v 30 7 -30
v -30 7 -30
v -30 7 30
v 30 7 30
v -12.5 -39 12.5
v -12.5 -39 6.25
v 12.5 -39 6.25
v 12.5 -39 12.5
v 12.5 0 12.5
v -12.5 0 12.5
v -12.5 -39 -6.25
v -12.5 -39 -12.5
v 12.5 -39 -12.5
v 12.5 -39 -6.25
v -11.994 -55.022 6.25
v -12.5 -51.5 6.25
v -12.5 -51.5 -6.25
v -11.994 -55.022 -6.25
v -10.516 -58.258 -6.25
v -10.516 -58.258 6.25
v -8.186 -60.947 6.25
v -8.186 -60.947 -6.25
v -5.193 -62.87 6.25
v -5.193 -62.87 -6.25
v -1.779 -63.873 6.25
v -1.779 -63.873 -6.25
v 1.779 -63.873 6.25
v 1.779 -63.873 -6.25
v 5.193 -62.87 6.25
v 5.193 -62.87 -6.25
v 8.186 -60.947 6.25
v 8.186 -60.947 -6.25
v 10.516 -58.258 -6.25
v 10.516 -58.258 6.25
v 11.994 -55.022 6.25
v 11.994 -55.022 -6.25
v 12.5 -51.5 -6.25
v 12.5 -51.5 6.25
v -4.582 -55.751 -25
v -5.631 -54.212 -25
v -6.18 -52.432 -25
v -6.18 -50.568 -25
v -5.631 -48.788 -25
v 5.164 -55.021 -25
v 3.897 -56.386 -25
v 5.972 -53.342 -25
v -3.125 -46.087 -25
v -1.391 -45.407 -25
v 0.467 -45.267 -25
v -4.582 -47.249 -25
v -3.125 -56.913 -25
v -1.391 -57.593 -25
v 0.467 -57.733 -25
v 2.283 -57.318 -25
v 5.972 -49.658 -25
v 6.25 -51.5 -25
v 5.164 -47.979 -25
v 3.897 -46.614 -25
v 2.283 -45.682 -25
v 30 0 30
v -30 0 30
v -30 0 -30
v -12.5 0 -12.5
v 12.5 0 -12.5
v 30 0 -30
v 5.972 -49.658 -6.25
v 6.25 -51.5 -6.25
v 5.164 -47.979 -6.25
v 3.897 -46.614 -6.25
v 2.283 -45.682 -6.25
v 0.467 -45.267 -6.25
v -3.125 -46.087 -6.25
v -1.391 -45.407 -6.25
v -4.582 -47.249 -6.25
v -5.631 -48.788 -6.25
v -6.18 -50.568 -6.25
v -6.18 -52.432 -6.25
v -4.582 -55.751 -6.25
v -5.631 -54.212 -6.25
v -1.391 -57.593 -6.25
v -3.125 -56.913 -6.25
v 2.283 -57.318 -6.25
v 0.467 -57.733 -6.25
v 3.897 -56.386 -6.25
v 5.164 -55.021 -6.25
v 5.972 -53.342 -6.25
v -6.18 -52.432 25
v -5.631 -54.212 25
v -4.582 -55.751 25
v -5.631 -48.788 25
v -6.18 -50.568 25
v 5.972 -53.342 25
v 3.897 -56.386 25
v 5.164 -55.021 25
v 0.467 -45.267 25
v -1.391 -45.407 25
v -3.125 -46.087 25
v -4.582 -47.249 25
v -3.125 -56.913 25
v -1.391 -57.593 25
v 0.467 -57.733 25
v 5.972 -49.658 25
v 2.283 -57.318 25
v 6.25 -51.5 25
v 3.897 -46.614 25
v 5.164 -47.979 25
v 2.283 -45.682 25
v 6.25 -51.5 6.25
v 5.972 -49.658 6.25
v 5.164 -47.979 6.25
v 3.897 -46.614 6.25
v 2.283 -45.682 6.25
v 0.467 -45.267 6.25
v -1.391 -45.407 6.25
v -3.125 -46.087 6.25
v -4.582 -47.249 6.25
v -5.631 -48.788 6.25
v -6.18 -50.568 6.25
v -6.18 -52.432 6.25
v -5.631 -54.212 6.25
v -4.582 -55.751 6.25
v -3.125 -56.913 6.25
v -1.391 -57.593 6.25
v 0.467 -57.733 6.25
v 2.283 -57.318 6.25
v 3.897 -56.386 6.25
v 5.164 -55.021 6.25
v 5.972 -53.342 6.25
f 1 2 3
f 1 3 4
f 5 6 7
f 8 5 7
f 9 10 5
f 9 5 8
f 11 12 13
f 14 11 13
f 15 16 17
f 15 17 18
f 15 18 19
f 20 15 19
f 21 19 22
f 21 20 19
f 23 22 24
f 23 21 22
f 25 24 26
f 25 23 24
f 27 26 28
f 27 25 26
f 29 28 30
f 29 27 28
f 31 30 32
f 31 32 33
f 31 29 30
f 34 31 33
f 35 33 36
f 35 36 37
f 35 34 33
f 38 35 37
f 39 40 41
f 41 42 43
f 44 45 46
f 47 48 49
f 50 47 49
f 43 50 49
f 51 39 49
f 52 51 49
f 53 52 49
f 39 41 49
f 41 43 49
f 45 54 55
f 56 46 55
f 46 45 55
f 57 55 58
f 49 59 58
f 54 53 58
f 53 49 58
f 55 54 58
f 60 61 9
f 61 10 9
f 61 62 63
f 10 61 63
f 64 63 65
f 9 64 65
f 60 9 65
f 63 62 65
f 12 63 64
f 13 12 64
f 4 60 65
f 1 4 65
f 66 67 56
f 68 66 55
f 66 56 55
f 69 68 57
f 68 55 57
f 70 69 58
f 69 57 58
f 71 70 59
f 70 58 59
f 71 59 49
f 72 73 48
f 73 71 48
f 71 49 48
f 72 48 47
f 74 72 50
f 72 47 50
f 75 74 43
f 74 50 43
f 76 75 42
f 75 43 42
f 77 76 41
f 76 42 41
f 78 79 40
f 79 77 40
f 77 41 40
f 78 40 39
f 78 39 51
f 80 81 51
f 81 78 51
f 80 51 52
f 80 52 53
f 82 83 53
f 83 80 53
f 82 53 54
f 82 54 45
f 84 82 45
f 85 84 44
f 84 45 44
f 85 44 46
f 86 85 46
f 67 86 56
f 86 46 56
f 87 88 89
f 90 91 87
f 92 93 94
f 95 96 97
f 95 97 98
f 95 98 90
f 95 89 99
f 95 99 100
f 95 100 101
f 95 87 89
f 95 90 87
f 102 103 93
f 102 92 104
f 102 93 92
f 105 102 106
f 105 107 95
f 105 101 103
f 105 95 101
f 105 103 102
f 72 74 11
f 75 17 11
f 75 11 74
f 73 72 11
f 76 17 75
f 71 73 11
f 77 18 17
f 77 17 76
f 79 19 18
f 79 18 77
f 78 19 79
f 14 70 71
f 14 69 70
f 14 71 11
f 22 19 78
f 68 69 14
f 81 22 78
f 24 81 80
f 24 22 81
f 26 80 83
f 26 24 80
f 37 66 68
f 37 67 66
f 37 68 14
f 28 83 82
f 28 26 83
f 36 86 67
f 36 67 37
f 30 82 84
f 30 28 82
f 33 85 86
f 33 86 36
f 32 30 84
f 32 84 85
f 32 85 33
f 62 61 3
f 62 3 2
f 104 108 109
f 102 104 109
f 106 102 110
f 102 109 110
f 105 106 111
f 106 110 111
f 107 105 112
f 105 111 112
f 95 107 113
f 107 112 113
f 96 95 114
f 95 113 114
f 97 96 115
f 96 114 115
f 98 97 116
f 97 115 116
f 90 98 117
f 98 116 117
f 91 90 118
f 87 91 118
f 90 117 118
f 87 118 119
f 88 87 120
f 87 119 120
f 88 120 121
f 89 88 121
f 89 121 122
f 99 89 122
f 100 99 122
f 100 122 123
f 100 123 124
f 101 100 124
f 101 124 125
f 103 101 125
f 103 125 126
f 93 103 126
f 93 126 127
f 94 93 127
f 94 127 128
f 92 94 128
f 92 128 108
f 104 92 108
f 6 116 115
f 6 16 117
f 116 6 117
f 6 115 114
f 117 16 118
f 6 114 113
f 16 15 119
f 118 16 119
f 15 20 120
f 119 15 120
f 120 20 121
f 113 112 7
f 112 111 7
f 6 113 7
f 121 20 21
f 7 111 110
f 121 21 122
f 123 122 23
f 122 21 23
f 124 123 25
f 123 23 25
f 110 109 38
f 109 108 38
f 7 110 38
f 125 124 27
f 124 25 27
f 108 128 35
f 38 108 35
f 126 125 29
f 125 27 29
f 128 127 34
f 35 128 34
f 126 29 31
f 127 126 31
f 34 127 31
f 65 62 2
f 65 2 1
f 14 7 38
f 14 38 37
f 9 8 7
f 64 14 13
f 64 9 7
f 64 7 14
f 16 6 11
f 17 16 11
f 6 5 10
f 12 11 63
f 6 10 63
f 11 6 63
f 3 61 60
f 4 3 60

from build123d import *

# Parameters (mm, degrees)
SKETCH_1_W           = 60
SKETCH_1_H           = 60
EXTRUDE_1_DEPTH      = 7
SKETCH_3_W           = 25
SKETCH_3_H           = 25
EXTRUDE_2_DEPTH      = 51.5
EXTRUDE_START        = 12.5
EXTRUDE_3_DEPTH      = 25
CUT_EXTRUDE_START    = -64
SKETCH_7_W           = 25
SKETCH_7_H           = 6.25
CUT_EXTRUDE_3_DEPTH  = 25
EXTRUDE_4_DEPTH      = 25
EXTRUDE_4_DEPTH_BACK = 25
SKETCH_8_R           = 6.25


with BuildPart() as part:
    # 草图1 → 凸台-拉伸1 (new body)
    with BuildSketch(Plane(origin=(0, 0, 0), x_dir=(1, 0, 0), z_dir=(0, 1, 0))):
        Rectangle(SKETCH_1_W, SKETCH_1_H)
    extrude(amount=EXTRUDE_1_DEPTH)

    # 草图3 → 凸台-拉伸2 (add)
    with BuildSketch(Plane(origin=(0, 0, 0), x_dir=(1, 0, 0), z_dir=(0, 1, 0))):
        Rectangle(SKETCH_3_W, SKETCH_3_H)
    extrude(amount=-EXTRUDE_2_DEPTH)

    # 草图4 → 凸台-拉伸3 (add)
    with BuildSketch(Plane.XY.offset(EXTRUDE_START)):
        with BuildLine():
            Line((12.5, -51.5), (-12.5, -51.5))
            ThreePointArc((-12.5, -51.5), (0, -64), (12.5, -51.5))
        make_face()
    extrude(amount=-EXTRUDE_3_DEPTH)

    # 草图7 → 切除-拉伸3 (cut)
    with BuildSketch(Plane(origin=(0, 0, 0), x_dir=(1, 0, 0), z_dir=(0, 1, 0)).offset(CUT_EXTRUDE_START)):
        with Locations((0, 9.375)):
            Rectangle(SKETCH_7_W, SKETCH_7_H)
        with Locations((0, -9.375)):
            Rectangle(SKETCH_7_W, SKETCH_7_H)
    extrude(amount=CUT_EXTRUDE_3_DEPTH, mode=Mode.SUBTRACT)

    # 草图8 → 凸台-拉伸4 (add, two sides: drawn at the far end of the back side and taken through both)
    with BuildSketch(Plane.XY.offset(-EXTRUDE_4_DEPTH_BACK)):
        with Locations((0, -51.5)):
            Circle(SKETCH_8_R)
    extrude(amount=EXTRUDE_4_DEPTH + EXTRUDE_4_DEPTH_BACK)


solid = part.part
